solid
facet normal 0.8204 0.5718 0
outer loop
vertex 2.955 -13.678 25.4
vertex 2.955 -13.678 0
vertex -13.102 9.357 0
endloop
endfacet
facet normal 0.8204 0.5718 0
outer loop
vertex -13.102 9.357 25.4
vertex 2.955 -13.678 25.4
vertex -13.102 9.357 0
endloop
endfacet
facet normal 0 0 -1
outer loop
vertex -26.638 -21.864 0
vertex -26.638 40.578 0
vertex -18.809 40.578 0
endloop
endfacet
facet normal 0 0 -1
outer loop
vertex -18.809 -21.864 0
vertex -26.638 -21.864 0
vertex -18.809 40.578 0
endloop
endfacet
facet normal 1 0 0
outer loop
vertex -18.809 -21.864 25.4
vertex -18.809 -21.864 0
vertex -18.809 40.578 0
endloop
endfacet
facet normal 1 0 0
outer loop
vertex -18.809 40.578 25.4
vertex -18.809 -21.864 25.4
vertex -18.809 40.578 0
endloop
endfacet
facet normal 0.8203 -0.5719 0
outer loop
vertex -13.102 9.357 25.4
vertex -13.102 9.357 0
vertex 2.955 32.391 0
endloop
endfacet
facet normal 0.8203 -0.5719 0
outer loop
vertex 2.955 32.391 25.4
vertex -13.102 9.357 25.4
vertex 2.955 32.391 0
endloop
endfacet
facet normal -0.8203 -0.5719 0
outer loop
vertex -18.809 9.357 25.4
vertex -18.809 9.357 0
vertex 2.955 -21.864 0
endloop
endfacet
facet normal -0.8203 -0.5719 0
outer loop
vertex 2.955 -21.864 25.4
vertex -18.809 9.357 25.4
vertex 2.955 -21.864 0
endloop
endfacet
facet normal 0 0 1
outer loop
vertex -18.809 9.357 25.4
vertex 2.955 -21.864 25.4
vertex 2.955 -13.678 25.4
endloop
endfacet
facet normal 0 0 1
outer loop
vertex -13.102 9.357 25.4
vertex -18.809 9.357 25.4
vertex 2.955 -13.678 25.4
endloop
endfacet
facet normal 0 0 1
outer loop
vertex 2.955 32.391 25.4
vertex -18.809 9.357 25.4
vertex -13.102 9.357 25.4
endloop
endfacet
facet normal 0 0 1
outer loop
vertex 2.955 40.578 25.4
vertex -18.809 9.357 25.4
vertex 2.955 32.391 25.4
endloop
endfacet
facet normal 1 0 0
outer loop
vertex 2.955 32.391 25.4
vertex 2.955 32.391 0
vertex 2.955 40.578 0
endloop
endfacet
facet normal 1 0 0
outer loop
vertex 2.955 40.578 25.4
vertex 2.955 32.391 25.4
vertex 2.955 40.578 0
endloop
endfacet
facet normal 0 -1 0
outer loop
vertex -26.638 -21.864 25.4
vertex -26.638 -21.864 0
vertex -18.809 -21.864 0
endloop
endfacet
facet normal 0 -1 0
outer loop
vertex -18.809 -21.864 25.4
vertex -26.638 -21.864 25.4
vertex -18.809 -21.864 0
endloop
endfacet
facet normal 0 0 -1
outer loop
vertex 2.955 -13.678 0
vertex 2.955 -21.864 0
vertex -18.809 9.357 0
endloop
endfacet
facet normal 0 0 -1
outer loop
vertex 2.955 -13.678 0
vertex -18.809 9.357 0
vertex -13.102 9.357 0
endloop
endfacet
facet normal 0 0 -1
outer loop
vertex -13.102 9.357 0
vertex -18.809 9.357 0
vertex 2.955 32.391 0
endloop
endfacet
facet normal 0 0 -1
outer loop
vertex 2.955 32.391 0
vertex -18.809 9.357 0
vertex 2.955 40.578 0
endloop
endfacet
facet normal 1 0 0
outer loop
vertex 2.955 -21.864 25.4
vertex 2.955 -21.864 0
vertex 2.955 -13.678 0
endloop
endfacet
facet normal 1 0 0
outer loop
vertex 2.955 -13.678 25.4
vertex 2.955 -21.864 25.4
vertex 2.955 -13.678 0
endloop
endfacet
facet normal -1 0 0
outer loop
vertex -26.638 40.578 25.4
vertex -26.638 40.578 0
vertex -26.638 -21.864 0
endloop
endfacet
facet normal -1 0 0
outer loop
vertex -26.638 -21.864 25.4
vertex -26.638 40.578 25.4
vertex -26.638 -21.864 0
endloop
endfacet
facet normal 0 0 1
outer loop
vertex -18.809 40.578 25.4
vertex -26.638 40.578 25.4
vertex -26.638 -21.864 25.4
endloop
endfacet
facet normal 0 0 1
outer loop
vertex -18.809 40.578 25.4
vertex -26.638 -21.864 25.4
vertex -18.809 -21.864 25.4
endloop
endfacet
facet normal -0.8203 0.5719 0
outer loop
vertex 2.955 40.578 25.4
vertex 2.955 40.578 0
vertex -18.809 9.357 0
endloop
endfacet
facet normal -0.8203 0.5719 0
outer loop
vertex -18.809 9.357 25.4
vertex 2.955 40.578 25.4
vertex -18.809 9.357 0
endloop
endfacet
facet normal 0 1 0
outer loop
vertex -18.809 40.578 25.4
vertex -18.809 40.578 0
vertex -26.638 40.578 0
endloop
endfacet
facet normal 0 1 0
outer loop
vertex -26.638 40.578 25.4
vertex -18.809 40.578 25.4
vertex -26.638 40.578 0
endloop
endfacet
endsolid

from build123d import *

# Parameters (mm, degrees)
F1_DEPTH = 25.4


# Not quite as in the source:
# - a feature of the source that left no trace in its solid (it failed there, or was rolled back) is left out


with BuildPart() as f1:
    # F0 (on Top) → F1 (new body)
    with BuildSketch(Plane.XY):
        Polygon((2.9549982864, 40.5778624117), (-18.8090335578, 9.3567771837), (2.9549982864, -21.8643080443), (2.9549982864, -13.6778589597), (-13.102308847, 9.3567771837), (2.9549982864, 32.3914133272), align=None)
    extrude(amount=F1_DEPTH)


with BuildPart() as f1b:
    # F0 (on Top) → F1, piece 2 (new body)
    with BuildSketch(Plane.XY):
        Polygon((-18.8090335578, 40.5778624117), (-26.6381744295, 40.5778624117), (-26.6381744295, -21.8643080443), (-18.8090335578, -21.8643080443), (-18.8090335578, 9.3567771837), align=None)
    extrude(amount=F1_DEPTH)


solid = Compound([f1.part, f1b.part])
